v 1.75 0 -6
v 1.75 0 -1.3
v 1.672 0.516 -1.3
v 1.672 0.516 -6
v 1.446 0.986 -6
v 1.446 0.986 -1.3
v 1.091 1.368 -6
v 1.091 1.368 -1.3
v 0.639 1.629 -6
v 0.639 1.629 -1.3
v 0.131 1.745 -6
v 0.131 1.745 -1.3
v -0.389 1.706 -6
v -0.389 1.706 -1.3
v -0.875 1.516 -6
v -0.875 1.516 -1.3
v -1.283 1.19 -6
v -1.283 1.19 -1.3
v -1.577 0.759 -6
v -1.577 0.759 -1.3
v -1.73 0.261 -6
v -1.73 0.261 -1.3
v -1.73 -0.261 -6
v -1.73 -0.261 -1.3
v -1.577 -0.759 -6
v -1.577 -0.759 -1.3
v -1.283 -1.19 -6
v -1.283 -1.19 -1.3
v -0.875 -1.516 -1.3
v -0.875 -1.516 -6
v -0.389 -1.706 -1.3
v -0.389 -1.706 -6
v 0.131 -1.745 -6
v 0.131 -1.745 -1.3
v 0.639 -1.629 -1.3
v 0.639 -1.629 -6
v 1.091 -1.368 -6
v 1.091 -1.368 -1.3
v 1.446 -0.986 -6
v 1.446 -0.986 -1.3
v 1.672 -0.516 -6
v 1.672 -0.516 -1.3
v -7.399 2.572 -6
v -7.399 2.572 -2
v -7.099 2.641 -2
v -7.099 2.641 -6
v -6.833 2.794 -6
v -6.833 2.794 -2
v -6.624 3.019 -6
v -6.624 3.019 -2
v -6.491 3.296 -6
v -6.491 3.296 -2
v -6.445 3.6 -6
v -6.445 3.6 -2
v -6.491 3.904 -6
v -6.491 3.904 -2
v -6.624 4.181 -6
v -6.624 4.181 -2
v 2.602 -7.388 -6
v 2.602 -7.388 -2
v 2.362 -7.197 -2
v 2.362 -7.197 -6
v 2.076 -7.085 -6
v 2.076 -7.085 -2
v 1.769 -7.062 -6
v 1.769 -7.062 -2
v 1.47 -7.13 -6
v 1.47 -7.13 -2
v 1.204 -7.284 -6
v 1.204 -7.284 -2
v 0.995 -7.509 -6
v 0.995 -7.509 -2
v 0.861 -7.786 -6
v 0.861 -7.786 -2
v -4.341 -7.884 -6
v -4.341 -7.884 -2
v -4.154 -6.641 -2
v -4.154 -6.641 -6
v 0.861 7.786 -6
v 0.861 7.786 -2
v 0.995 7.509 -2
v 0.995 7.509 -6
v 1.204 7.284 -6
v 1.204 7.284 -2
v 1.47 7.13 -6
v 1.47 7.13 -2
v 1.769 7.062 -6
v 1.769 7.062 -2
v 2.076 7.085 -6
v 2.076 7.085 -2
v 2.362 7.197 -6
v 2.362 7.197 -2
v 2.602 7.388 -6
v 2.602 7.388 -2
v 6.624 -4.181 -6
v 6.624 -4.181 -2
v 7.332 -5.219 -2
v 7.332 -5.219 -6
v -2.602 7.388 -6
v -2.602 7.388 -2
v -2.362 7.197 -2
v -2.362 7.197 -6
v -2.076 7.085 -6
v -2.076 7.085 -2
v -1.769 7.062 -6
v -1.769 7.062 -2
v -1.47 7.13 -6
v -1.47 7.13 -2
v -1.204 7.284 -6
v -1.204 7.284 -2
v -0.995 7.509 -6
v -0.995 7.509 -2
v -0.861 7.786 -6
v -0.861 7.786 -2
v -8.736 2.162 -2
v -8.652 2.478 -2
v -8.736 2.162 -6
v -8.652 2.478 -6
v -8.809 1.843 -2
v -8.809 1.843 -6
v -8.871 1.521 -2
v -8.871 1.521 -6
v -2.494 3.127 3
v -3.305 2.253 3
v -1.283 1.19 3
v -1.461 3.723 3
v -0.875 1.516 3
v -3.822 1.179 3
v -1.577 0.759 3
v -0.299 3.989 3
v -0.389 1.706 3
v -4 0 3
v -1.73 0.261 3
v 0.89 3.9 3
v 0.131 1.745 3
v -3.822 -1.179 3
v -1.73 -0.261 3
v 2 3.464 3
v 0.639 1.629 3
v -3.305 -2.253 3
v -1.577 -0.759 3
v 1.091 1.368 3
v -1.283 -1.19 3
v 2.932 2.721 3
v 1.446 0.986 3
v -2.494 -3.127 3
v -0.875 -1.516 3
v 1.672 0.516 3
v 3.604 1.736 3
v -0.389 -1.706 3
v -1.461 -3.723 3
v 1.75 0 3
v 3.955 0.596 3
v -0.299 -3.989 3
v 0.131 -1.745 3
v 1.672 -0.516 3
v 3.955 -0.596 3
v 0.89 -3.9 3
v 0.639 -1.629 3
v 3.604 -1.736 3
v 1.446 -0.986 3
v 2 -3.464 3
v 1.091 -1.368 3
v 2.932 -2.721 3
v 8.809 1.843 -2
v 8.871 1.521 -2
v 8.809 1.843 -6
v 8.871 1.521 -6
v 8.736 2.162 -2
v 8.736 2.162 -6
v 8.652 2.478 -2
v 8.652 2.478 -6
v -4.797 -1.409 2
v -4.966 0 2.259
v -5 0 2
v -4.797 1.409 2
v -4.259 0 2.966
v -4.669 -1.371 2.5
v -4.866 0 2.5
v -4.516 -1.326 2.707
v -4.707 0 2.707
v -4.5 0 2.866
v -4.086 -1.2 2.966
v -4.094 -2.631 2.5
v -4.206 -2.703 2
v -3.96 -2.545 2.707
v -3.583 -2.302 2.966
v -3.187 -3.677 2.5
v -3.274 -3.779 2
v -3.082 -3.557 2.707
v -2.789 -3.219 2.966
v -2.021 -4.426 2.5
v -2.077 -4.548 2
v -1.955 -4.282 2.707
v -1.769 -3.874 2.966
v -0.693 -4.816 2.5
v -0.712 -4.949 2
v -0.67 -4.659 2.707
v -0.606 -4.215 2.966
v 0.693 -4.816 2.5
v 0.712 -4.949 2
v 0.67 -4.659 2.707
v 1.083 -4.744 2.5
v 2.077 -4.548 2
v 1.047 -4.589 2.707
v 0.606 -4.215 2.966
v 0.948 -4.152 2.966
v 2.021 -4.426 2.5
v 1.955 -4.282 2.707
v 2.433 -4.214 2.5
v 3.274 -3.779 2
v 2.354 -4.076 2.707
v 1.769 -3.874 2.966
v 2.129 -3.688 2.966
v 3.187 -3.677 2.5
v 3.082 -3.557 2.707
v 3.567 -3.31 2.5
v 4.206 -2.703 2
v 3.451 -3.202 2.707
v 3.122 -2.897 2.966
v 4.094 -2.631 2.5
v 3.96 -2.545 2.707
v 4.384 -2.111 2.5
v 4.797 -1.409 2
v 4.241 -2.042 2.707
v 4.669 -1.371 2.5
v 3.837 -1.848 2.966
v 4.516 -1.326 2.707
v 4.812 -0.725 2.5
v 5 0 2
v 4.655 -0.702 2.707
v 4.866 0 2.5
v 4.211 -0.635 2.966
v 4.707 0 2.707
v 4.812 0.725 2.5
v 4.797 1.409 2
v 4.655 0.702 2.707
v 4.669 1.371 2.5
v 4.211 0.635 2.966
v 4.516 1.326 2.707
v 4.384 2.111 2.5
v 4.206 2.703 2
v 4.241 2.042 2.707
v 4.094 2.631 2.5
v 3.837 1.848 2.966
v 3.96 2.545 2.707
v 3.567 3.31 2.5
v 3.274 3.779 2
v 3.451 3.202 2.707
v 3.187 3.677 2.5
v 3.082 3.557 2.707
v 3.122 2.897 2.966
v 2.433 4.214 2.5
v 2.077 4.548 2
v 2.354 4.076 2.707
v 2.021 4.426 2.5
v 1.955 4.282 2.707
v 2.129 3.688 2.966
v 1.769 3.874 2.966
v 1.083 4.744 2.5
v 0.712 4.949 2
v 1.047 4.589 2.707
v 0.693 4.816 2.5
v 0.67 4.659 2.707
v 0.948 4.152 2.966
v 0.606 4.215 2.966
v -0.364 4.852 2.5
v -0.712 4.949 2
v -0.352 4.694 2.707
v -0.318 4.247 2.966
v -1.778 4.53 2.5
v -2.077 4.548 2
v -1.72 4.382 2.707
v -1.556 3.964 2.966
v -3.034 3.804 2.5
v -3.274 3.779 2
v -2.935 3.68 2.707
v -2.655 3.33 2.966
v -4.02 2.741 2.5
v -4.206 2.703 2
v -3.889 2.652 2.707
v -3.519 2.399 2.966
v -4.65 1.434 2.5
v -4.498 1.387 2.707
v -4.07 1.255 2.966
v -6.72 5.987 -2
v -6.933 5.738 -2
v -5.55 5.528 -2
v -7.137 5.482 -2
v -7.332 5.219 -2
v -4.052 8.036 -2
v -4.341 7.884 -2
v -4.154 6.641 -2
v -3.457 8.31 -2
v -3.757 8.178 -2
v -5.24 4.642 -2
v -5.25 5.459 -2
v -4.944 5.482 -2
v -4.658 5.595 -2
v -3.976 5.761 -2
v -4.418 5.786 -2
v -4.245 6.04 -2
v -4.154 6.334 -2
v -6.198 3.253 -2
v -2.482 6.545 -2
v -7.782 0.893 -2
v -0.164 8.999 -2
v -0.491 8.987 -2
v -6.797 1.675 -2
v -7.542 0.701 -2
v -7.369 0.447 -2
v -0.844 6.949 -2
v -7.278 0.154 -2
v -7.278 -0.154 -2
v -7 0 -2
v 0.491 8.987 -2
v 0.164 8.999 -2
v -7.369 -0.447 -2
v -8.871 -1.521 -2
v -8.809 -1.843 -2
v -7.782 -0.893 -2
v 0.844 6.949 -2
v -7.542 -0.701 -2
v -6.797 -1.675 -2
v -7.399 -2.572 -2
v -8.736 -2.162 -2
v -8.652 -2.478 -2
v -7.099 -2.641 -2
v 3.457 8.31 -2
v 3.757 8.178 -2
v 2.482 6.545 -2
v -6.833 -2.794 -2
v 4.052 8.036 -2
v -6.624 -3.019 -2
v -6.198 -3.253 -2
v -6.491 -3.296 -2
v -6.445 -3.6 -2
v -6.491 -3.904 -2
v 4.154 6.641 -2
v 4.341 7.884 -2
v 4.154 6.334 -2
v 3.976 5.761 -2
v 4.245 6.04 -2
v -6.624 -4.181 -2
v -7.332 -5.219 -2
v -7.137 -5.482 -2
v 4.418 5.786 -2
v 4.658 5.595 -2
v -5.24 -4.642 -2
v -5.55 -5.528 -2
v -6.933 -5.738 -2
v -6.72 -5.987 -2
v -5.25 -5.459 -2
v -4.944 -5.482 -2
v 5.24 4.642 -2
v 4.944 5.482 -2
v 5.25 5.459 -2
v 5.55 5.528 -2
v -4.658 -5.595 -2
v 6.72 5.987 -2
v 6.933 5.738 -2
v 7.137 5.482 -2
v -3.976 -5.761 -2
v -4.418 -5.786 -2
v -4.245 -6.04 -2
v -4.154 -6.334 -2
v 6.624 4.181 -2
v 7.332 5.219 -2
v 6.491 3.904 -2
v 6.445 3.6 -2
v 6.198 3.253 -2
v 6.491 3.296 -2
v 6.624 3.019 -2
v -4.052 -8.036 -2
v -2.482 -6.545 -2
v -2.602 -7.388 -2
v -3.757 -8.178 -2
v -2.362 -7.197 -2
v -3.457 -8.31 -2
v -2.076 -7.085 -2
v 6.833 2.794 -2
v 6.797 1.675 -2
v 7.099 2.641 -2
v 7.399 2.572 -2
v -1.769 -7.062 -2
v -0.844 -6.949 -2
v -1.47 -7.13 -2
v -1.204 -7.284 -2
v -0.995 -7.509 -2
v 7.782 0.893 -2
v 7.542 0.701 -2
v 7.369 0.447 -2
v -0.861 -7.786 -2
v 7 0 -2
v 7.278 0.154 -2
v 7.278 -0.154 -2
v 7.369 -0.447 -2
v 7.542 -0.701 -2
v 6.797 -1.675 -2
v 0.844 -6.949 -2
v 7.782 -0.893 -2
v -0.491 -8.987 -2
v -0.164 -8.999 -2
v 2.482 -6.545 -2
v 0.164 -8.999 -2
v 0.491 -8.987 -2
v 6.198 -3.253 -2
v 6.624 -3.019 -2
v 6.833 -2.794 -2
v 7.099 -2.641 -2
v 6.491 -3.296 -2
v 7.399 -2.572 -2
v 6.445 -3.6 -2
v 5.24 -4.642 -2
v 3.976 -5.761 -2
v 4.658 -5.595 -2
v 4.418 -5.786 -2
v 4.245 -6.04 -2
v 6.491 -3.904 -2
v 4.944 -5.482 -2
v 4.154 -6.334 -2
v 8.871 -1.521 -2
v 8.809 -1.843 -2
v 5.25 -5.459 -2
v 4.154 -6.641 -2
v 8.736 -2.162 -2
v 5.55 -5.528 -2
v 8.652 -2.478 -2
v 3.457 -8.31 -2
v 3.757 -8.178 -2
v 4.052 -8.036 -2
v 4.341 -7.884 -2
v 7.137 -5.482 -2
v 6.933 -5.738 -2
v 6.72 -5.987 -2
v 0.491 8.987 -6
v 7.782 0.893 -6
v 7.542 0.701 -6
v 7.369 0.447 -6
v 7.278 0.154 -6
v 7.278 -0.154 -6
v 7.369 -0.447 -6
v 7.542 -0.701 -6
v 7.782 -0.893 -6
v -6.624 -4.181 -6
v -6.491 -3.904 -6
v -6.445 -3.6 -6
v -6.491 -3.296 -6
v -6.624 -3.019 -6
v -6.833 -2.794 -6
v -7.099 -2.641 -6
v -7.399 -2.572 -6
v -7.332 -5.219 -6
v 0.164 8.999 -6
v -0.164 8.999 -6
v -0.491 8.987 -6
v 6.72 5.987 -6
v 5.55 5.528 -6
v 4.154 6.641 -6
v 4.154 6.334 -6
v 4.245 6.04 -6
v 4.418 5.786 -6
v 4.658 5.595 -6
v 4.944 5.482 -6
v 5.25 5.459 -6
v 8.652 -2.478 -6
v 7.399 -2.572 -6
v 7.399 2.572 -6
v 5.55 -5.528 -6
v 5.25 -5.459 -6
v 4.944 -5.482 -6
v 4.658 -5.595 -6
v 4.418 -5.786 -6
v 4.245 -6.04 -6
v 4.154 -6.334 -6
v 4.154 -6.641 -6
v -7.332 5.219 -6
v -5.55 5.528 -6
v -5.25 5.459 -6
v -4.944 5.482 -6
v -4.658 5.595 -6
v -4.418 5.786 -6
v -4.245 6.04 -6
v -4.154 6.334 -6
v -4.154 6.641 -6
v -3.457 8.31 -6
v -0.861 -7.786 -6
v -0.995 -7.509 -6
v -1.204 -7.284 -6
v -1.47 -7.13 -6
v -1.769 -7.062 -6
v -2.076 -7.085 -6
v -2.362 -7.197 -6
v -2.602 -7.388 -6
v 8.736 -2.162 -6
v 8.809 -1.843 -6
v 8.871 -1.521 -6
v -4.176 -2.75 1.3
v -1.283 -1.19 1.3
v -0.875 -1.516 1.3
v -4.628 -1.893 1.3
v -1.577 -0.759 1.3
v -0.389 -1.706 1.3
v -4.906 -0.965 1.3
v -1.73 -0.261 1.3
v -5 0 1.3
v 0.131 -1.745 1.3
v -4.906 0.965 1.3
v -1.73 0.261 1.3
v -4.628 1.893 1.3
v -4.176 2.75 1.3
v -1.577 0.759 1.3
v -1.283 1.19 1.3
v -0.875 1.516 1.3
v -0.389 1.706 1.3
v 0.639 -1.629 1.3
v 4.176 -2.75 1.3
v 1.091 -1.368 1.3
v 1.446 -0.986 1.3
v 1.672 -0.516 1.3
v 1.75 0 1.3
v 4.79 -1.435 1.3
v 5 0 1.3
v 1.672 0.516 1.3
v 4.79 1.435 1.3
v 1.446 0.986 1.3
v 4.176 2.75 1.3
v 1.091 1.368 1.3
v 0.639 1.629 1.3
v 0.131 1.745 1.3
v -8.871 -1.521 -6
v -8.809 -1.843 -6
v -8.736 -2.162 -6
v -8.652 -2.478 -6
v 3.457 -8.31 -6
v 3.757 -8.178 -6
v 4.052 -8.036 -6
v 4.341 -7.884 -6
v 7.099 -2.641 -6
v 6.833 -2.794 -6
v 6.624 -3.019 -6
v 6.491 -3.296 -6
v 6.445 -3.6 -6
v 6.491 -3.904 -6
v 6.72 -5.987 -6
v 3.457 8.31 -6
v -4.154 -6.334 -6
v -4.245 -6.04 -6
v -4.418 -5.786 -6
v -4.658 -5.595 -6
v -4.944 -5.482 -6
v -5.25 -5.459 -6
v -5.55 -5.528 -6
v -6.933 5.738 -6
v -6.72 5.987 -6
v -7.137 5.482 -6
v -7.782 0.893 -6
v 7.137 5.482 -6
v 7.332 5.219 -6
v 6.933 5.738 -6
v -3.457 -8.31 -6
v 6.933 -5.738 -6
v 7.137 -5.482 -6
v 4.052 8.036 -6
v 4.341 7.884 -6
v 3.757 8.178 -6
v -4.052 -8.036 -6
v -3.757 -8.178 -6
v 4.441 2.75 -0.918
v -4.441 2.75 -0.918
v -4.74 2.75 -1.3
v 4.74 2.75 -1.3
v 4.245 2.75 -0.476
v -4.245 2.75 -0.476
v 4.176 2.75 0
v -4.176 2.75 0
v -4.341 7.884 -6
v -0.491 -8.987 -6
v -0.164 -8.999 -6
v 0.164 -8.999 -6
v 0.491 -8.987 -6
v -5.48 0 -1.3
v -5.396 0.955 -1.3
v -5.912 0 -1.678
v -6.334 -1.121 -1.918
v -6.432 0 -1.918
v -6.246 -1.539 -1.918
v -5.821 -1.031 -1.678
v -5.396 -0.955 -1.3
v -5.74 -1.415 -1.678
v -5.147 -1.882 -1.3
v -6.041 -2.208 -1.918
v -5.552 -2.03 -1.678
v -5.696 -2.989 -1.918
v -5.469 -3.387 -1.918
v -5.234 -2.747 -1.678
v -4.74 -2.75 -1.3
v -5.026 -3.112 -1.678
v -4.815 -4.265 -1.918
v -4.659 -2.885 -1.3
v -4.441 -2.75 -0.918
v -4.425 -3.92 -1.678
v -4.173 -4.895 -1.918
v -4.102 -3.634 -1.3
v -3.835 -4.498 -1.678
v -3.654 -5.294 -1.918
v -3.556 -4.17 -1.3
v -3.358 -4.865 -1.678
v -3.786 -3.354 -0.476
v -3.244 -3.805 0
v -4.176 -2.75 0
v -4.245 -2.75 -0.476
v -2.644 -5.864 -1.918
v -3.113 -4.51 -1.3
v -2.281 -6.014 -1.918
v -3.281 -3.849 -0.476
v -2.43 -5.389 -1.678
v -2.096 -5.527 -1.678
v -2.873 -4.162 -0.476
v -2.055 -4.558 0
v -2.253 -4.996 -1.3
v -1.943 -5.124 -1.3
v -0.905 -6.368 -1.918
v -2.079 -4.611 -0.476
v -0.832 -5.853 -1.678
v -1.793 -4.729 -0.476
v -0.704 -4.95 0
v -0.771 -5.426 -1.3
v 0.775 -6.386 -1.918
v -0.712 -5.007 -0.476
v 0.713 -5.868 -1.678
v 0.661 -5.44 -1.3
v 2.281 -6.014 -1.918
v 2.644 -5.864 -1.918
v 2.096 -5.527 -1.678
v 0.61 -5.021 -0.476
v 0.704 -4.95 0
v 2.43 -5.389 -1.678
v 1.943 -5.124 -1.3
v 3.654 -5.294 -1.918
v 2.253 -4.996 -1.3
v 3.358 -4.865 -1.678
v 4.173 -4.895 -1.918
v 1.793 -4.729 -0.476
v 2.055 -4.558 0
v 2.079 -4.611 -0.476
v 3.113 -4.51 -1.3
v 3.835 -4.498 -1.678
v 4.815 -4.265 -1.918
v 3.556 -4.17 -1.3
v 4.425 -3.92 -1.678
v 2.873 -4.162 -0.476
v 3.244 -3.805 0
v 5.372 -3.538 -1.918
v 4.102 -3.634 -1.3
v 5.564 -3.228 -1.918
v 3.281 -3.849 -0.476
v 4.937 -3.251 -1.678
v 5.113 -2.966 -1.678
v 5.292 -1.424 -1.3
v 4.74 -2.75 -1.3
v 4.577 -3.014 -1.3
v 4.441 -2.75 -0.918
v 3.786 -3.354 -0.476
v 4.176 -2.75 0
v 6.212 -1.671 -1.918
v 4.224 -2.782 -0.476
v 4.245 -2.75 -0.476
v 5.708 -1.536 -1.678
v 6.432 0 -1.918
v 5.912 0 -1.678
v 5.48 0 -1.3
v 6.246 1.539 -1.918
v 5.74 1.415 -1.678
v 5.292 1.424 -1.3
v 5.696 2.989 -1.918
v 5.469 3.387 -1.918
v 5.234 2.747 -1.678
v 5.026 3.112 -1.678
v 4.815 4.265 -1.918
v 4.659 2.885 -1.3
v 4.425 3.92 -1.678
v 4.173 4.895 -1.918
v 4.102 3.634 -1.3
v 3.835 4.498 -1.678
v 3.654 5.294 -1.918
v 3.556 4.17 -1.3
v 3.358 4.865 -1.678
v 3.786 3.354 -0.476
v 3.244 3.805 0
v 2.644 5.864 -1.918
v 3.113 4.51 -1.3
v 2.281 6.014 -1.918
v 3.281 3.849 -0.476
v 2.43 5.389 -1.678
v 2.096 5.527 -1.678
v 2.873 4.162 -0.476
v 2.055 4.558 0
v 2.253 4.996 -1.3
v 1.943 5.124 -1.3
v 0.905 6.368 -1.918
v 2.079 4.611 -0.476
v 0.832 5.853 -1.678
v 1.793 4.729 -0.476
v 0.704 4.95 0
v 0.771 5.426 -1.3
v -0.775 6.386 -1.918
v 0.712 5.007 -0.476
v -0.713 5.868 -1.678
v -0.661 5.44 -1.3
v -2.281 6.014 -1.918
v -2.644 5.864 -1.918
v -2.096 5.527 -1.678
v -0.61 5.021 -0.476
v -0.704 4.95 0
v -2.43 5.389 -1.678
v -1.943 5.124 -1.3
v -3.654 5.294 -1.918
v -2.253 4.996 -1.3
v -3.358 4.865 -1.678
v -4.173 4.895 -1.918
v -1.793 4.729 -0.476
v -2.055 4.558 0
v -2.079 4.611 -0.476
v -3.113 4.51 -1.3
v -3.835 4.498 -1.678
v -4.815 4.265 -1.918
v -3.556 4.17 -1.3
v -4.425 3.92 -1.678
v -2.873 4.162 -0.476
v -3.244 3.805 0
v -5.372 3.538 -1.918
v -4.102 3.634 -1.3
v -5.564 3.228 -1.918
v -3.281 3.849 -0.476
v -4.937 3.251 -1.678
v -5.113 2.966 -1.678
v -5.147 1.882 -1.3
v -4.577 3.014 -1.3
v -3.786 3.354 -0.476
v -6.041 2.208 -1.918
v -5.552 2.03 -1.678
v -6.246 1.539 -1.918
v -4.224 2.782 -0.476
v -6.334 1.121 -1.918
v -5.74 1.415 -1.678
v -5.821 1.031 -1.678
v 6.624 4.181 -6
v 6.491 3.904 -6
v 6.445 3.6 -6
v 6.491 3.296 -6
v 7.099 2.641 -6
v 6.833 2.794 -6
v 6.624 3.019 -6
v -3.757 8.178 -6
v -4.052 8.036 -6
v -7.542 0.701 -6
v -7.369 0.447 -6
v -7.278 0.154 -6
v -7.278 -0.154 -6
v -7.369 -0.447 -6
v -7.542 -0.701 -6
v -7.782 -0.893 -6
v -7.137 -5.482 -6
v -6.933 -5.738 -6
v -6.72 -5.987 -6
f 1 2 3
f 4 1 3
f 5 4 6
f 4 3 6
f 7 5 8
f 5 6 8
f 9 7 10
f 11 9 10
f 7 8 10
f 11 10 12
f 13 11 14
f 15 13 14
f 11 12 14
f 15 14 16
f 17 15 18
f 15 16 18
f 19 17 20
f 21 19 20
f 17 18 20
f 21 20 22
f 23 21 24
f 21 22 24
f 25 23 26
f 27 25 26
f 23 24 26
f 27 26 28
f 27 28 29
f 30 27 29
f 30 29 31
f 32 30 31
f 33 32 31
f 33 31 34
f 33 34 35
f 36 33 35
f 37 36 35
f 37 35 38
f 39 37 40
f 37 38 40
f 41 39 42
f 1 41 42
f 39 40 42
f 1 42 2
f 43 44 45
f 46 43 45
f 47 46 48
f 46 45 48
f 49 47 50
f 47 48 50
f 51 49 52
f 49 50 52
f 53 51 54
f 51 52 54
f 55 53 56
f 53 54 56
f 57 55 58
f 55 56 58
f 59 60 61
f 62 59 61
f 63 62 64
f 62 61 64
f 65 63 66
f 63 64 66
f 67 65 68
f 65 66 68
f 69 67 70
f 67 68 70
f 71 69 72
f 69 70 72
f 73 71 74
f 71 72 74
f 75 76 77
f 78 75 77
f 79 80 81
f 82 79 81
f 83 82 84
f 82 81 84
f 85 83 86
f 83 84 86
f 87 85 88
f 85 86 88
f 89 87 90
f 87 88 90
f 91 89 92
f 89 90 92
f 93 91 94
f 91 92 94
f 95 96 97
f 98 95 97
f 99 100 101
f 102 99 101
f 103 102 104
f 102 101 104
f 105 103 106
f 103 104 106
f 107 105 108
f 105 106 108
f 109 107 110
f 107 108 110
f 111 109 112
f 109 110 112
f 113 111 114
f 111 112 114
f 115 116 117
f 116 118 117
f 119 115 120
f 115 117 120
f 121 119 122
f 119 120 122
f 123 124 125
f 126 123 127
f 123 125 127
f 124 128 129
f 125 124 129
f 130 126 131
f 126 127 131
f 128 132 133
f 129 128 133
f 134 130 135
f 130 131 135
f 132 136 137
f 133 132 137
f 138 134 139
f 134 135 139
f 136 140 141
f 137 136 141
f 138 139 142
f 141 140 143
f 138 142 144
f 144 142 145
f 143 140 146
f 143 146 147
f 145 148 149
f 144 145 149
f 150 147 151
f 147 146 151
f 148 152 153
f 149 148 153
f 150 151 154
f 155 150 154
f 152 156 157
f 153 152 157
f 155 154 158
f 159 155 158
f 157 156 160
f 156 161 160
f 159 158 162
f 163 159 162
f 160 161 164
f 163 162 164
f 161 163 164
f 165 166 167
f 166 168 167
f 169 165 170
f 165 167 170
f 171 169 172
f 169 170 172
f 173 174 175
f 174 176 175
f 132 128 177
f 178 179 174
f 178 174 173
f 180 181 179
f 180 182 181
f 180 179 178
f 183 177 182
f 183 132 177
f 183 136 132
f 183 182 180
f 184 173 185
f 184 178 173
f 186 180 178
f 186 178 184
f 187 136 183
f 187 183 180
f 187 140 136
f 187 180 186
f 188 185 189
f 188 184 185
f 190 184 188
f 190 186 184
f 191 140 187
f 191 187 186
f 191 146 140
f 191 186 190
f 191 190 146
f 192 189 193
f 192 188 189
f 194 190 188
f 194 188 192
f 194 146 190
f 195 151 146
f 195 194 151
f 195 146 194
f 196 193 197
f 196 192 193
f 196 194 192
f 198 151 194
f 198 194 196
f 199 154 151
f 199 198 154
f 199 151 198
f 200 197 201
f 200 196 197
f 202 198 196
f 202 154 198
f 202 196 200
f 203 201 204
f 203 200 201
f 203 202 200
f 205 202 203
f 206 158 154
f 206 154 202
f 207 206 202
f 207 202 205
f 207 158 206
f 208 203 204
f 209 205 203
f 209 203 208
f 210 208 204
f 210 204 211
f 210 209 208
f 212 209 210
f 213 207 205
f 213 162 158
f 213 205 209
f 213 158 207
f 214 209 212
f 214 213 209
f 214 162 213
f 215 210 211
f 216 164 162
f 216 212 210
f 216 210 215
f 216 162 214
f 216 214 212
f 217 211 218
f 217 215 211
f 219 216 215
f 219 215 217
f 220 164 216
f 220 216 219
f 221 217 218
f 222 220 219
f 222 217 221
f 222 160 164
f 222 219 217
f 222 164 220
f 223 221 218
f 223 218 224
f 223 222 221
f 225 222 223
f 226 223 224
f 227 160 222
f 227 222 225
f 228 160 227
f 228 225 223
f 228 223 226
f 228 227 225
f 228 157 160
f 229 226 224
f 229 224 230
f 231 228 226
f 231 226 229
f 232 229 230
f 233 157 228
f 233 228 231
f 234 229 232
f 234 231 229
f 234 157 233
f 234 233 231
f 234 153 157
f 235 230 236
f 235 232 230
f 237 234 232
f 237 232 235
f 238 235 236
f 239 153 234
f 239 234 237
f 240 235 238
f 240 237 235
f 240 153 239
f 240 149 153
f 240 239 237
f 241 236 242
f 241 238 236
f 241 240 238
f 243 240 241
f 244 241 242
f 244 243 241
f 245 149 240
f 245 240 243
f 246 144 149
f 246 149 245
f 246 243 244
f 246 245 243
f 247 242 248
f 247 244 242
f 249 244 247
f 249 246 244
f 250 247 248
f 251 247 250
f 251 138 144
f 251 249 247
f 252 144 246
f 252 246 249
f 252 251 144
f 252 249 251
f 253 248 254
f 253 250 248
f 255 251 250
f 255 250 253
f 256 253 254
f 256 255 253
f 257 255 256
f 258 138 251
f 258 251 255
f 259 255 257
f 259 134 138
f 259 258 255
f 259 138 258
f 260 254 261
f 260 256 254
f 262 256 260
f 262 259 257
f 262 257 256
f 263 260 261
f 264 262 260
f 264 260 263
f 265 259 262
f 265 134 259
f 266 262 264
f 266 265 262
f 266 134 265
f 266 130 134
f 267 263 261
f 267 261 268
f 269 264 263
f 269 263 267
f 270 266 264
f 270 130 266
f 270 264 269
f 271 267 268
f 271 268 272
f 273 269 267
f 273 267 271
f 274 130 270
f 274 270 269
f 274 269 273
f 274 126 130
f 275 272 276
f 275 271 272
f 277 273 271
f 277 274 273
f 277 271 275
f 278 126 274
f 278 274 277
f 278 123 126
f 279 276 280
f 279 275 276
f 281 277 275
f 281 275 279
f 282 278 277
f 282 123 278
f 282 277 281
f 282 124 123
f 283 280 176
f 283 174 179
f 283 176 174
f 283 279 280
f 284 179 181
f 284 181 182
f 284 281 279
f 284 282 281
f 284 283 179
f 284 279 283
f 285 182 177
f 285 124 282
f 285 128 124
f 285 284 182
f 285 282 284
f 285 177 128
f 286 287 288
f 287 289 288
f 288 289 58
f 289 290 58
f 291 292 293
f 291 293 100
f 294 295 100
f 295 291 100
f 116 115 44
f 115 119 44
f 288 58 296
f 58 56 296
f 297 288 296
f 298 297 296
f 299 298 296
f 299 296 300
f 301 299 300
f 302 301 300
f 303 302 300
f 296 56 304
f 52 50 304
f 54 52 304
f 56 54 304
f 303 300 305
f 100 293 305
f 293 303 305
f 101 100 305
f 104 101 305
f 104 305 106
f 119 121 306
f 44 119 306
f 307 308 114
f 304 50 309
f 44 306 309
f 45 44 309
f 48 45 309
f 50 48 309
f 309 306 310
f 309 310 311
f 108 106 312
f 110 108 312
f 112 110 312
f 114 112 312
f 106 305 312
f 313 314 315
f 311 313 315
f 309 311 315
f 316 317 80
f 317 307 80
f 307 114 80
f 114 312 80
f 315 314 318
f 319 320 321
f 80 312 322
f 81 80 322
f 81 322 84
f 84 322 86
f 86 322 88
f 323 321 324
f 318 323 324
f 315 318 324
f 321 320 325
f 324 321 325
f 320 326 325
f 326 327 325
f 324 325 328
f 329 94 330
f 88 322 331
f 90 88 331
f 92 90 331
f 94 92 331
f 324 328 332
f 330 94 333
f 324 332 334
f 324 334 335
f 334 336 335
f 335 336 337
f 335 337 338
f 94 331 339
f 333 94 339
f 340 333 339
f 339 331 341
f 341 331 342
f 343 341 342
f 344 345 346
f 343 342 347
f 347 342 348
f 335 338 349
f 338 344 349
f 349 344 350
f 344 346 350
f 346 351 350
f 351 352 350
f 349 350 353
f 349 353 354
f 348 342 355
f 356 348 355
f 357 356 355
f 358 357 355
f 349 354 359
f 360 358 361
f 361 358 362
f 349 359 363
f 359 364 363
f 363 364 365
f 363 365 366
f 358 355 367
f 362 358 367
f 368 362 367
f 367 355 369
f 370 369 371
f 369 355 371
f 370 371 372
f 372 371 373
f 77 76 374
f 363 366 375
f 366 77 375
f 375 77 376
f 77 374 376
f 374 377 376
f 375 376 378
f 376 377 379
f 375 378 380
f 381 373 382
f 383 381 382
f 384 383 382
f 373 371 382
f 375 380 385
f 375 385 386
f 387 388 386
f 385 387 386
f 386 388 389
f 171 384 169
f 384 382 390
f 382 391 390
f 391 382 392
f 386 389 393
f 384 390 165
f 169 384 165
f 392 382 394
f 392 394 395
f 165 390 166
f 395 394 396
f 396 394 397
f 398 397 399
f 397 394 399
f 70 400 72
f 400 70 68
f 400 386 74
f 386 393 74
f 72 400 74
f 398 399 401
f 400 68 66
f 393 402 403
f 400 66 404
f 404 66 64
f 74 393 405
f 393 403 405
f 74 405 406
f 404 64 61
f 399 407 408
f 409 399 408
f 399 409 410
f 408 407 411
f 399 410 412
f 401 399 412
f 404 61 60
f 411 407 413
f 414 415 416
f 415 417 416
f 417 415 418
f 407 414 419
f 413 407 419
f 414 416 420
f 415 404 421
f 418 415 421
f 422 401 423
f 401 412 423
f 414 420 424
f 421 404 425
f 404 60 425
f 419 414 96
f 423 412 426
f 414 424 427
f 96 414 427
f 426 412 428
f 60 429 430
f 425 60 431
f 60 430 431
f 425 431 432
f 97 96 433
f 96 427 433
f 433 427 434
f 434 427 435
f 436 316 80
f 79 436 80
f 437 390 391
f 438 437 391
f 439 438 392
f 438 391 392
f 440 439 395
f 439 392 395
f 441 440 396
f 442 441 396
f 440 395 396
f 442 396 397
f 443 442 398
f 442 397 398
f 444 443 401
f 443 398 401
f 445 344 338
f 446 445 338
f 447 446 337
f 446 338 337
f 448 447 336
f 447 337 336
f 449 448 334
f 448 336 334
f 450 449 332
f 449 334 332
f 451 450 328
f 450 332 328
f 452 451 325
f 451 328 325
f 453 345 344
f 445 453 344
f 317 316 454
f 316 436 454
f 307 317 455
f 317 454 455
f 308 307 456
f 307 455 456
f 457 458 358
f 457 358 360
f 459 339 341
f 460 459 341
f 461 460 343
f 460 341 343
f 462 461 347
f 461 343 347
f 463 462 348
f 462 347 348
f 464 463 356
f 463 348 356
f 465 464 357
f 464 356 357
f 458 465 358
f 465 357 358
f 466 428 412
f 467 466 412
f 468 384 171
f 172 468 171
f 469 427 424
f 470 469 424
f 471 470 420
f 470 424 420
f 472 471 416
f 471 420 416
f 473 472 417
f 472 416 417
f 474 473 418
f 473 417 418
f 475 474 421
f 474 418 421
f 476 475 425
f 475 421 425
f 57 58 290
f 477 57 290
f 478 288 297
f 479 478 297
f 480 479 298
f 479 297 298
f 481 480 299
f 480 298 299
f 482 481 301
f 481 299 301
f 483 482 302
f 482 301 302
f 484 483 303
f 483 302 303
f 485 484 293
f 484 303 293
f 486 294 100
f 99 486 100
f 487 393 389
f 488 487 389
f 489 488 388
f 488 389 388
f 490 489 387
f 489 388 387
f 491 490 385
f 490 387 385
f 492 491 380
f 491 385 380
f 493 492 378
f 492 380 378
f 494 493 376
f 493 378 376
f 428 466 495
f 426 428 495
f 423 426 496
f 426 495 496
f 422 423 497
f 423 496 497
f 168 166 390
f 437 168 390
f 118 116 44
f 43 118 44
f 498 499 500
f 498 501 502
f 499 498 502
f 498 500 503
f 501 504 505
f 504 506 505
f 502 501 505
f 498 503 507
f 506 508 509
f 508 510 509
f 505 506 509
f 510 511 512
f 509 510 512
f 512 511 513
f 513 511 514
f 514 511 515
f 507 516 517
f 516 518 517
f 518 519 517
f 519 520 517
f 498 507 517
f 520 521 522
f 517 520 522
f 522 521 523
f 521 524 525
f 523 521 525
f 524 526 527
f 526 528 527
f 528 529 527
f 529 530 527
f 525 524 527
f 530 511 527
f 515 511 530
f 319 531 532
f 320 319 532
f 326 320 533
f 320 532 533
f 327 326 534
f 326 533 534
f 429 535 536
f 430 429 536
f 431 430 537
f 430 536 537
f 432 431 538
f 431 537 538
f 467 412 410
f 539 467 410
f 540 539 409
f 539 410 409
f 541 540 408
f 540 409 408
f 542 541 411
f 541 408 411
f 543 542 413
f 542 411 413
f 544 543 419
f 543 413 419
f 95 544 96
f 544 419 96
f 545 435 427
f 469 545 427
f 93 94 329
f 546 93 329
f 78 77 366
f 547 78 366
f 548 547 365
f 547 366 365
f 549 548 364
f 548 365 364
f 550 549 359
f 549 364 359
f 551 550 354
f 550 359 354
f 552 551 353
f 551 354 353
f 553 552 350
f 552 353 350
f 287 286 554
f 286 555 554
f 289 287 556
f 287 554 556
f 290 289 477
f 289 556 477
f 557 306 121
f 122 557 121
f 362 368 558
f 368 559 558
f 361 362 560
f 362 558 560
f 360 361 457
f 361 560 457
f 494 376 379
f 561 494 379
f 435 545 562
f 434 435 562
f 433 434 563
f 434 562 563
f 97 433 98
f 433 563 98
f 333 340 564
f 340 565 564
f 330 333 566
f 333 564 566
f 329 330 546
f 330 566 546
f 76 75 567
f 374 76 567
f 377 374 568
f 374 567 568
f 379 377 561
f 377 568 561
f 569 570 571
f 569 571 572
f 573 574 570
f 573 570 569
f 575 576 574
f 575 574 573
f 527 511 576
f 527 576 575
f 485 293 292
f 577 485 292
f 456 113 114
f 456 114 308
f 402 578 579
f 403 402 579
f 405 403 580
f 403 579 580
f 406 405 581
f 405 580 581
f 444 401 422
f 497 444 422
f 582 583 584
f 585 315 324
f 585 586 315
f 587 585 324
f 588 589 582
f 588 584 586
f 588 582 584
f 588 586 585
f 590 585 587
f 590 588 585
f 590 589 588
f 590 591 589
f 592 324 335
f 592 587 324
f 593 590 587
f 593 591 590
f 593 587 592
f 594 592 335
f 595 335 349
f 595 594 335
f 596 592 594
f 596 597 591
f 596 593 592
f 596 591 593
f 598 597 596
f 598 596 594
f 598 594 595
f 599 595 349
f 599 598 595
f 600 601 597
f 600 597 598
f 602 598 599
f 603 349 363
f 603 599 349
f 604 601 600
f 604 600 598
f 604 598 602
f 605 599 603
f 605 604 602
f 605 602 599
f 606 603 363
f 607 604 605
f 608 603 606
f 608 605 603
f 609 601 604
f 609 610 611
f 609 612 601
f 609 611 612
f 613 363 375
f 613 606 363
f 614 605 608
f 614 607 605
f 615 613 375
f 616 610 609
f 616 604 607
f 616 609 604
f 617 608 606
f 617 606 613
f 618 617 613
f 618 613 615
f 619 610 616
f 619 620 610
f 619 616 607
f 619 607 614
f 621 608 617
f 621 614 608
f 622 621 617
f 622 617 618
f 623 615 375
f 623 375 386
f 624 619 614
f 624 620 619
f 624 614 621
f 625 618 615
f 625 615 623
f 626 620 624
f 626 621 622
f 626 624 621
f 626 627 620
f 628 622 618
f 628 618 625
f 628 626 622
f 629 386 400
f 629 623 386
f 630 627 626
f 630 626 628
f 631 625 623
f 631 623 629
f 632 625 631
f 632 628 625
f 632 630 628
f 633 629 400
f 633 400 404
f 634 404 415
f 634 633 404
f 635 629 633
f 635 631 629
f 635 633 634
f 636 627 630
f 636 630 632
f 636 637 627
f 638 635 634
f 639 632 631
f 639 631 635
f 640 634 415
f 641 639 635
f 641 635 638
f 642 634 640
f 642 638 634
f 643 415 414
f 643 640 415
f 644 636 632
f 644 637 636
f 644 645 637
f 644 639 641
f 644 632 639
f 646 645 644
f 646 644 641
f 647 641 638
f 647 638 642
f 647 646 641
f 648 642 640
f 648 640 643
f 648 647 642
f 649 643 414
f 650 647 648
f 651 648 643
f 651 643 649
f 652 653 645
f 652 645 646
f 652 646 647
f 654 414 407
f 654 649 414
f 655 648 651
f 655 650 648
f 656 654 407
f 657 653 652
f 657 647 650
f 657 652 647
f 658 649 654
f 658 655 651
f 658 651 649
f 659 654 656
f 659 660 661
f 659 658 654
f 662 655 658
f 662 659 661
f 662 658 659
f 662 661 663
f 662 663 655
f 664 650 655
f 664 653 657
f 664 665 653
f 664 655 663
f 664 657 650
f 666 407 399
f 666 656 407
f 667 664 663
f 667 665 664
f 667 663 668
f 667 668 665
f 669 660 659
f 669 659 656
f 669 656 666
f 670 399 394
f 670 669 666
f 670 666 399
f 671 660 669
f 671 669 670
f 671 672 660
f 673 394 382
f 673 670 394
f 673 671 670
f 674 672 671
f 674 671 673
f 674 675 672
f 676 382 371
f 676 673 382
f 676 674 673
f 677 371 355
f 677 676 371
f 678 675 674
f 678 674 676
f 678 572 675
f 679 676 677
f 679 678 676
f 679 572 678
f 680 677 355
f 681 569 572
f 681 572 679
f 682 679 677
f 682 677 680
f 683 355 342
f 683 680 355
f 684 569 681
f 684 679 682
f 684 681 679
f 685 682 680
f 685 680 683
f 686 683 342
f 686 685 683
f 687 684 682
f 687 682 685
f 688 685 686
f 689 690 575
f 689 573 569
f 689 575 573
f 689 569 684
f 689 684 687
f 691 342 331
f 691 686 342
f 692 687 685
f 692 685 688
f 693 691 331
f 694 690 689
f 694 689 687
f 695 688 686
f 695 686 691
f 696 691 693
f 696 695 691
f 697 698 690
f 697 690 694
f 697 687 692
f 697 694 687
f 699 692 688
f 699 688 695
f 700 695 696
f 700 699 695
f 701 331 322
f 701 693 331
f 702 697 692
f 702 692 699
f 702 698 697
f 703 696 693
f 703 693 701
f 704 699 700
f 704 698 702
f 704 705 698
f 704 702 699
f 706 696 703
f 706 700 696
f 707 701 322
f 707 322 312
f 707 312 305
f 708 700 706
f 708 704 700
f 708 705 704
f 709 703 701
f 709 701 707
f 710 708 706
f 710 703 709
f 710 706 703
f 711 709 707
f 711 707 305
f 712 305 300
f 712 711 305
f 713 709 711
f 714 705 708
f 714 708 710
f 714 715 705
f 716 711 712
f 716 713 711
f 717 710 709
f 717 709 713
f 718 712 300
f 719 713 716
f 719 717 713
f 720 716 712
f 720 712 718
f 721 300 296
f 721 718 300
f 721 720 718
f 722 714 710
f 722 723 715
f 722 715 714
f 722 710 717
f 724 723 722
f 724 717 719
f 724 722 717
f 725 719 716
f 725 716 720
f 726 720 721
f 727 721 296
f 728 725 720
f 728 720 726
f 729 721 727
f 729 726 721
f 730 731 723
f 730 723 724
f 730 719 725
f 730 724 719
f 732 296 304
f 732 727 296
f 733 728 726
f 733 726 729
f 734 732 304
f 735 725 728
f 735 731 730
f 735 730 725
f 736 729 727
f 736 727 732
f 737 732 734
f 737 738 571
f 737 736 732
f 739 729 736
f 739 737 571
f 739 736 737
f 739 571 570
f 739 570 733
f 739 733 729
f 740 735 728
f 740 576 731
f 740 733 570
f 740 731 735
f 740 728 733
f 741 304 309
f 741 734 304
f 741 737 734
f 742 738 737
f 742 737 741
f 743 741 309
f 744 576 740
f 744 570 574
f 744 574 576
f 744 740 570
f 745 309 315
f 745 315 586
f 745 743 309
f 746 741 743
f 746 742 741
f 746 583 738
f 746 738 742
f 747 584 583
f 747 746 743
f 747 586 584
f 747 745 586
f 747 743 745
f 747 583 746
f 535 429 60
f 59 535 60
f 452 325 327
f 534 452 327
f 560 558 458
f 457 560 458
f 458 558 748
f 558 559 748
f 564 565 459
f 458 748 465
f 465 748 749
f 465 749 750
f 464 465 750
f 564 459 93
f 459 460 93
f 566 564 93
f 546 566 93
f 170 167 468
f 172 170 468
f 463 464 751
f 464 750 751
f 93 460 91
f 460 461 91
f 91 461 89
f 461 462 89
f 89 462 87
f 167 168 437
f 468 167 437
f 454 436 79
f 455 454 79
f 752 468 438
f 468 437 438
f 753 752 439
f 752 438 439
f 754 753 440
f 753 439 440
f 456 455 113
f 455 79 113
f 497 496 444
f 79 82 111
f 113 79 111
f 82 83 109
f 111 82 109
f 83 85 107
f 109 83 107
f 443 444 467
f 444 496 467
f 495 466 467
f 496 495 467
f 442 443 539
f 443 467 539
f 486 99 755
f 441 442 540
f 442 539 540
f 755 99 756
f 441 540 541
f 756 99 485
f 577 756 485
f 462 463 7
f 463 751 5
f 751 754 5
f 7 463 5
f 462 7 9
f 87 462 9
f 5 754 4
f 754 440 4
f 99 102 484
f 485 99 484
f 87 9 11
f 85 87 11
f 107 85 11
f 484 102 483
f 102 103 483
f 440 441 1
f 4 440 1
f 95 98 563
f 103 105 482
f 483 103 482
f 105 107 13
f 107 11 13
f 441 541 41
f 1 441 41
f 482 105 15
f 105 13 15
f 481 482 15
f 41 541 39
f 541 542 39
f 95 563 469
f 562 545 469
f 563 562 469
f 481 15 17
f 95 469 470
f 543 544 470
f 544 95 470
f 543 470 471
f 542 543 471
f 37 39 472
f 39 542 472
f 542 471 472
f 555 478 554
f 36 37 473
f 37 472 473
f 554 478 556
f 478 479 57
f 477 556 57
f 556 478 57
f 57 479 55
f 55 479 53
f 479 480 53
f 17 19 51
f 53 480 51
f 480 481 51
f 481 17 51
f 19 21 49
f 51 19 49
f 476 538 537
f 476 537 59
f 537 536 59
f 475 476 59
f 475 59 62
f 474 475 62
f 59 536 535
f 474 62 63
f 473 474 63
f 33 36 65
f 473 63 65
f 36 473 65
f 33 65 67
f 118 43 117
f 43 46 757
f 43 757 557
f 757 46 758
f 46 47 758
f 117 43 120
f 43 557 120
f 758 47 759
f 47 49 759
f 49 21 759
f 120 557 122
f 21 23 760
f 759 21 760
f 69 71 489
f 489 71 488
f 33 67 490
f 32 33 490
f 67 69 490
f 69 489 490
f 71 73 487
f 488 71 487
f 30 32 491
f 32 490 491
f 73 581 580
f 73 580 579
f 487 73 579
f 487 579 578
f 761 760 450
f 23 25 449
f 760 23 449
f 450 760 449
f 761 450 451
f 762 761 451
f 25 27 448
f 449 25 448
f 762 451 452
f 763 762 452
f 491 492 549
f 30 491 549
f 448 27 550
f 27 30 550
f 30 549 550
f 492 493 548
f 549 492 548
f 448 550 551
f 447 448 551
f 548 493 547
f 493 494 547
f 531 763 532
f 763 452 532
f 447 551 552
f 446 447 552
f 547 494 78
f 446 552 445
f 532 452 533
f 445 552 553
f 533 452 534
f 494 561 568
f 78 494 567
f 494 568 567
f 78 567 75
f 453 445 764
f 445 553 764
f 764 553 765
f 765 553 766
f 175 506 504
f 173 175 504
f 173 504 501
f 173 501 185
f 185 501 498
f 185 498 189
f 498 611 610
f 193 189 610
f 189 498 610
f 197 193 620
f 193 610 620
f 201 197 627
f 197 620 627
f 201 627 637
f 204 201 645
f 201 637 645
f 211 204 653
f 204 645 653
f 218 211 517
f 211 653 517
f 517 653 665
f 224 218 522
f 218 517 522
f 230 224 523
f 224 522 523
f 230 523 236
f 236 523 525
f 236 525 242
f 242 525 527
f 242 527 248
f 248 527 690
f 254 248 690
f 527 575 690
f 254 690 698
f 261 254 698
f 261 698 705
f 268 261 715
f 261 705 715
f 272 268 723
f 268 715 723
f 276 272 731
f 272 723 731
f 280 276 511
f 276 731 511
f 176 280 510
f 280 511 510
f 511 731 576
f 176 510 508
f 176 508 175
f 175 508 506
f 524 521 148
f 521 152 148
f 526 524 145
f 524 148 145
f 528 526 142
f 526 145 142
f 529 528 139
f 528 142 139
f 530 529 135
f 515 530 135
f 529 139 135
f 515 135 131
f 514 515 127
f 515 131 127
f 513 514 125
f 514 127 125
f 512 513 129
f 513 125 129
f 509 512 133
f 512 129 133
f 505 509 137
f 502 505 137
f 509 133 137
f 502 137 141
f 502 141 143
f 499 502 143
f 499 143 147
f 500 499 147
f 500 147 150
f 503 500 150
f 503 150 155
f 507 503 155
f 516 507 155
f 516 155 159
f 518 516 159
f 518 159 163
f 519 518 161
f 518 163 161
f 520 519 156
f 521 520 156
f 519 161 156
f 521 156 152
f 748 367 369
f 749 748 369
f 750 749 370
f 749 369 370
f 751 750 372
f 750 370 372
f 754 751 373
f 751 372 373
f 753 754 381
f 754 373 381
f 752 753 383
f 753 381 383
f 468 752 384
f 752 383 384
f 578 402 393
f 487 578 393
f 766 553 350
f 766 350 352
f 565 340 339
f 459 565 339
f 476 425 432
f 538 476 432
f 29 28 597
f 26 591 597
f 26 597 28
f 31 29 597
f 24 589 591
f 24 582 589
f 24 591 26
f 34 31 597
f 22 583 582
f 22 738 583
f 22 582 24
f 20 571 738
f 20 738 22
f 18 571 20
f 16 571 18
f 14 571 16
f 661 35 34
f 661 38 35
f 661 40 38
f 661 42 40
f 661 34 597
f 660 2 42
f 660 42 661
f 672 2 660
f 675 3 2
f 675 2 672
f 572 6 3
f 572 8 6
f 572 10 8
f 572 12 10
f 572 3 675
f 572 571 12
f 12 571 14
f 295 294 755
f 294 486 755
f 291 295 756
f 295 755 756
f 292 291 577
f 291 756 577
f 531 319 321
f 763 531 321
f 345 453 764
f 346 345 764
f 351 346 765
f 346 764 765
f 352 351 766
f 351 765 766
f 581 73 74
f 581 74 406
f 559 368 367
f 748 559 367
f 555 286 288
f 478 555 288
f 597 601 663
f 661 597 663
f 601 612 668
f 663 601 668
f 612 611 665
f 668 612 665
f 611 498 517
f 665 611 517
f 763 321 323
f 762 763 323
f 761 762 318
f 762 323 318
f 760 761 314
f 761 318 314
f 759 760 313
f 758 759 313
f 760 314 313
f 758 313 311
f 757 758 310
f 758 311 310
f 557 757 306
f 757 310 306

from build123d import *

# Parameters (mm, degrees)
F3_R     = 1.75
F4_DEPTH = 12.5
F6_R     = 2
F8_DEPTH = 10
F2_W     = 25.478227
F2_H     = 5.5
F9_DEPTH = 1.3
F10_R    = 1


with BuildPart() as f1:
    # F0 (on Front) → F1 (revolve)
    with BuildSketch(Plane.XZ):
        Polygon((-9, -6), (0, -6), (0, 3), (-5, 3), (-5, -2), (-9, -2), align=None)
    revolve(axis=Axis((0, 0, -1.5), (0, 0, 1)))


with BuildPart() as f4:
    # F3 (on Top) → F4 (new body, symmetric)
    with BuildSketch(Plane.XY):
        Circle(F3_R)
    extrude(amount=F4_DEPTH, both=True)


with BuildPart() as f1_1:
    add(f1.part)

    # F5: cut F4
    add(f4.part, mode=Mode.SUBTRACT)

    # F6
    f6_edges = [f1_1.edges().sort_by_distance(p)[0] for p in [
        (5, 0, -2),
    ]]
    fillet(f6_edges, radius=F6_R)

    # F7 (on Top) → F8 (cut)
    with BuildSketch(Plane.XY):
        with BuildLine():
            ThreePointArc((-7.782135, -0.892736), (-7.266714, 0), (-7.782135, 0.892736))
            Line((-7.782135, 0.892736), (-10.312837, 2.353838))
            Line((-10.312837, 2.353838), (-10.499112, 2.339878))
            Line((-10.499112, 2.339878), (-10.499112, -2.339878))
            Line((-10.499112, -2.339878), (-10.312837, -2.353838))
            Line((-10.312837, -2.353838), (-7.782135, -0.892736))
        make_face()
        with BuildLine():
            Line((-10.474608, 2.447236), (-10.312837, 2.353838))
            Line((-10.312837, 2.353838), (-7.398805, 2.572214))
            ThreePointArc((-7.398805, 2.572214), (-6.547083, 3.152909), (-6.624118, 4.180869))
            Line((-6.624118, 4.180869), (-8.270253, 6.595307))
            Line((-8.270253, 6.595307), (-8.444138, 6.663552))
            Line((-8.444138, 6.663552), (-10.474608, 2.447236))
        make_face()
        Polygon((-10.499112, 2.396354), (-10.474608, 2.447236), (-10.499112, 2.461384), align=None)
        Polygon((-10.527328, 2.337764), (-10.499112, 2.339878), (-10.499112, 2.396354), align=None)
        with BuildLine():
            Line((-7.398805, -2.572214), (-10.312837, -2.353838))
            Line((-10.312837, -2.353838), (-10.474608, -2.447236))
            Line((-10.474608, -2.447236), (-8.444138, -6.663552))
            Line((-8.444138, -6.663552), (-8.270253, -6.595307))
            Line((-8.270253, -6.595307), (-6.624118, -4.180869))
            ThreePointArc((-6.624118, -4.180869), (-6.547083, -3.152909), (-7.398805, -2.572214))
        make_face()
        Polygon((-8.470477, 6.673889), (-8.444138, 6.663552), (-8.419634, 6.714434), align=None)
        Polygon((-10.499112, -2.396354), (-10.499112, -2.339878), (-10.527328, -2.337764), align=None)
        Polygon((-10.499112, -2.461384), (-10.474608, -2.447236), (-10.499112, -2.396354), align=None)
        with BuildLine():
            Line((-8.37548, 6.749646), (-8.270253, 6.595307))
            Line((-8.270253, 6.595307), (-5.550051, 5.527706))
            ThreePointArc((-5.550051, 5.527706), (-4.530722, 5.681345), (-4.154113, 6.64093))
            Line((-4.154113, 6.64093), (-4.589644, 9.530495))
            Line((-4.589644, 9.530495), (-4.716699, 9.667427))
            Line((-4.716699, 9.667427), (-8.37548, 6.749646))
        make_face()
        Polygon((-8.391419, 6.773024), (-8.419634, 6.714434), (-8.37548, 6.749646), align=None)
        Polygon((-8.419634, -6.714434), (-8.444138, -6.663552), (-8.470477, -6.673889), align=None)
        Polygon((-8.37548, -6.749646), (-8.419634, -6.714434), (-8.391419, -6.773024), align=None)
        with BuildLine():
            Line((-5.550051, -5.527706), (-8.270253, -6.595307))
            Line((-8.270253, -6.595307), (-8.37548, -6.749646))
            Line((-8.37548, -6.749646), (-4.716699, -9.667427))
            Line((-4.716699, -9.667427), (-4.589644, -9.530495))
            Line((-4.589644, -9.530495), (-4.154113, -6.64093))
            ThreePointArc((-4.154113, -6.64093), (-4.530722, -5.681345), (-5.550051, -5.527706))
        make_face()
        Polygon((-4.735944, 9.688168), (-4.716699, 9.667427), (-4.672544, 9.702639), align=None)
        with BuildLine():
            Line((-4.617485, 9.715206), (-4.589644, 9.530495))
            Line((-4.589644, 9.530495), (-2.602041, 7.388368))
            ThreePointArc((-2.602041, 7.388368), (-1.616996, 7.084522), (-0.861334, 7.785673))
            Line((-0.861334, 7.785673), (0, 10.578051))
            Line((0, 10.578051), (-0.055059, 10.756549))
            Line((-0.055059, 10.756549), (-4.617485, 9.715206))
        make_face()
        Polygon((-4.621702, 9.743184), (-4.672544, 9.702639), (-4.617485, 9.715206), align=None)
        Polygon((-4.672544, -9.702639), (-4.716699, -9.667427), (-4.735944, -9.688168), align=None)
        Polygon((-4.617485, -9.715206), (-4.672544, -9.702639), (-4.621702, -9.743184), align=None)
        with BuildLine():
            Line((-2.602041, -7.388368), (-4.589644, -9.530495))
            Line((-4.589644, -9.530495), (-4.617485, -9.715206))
            Line((-4.617485, -9.715206), (-0.055059, -10.756549))
            Line((-0.055059, -10.756549), (0, -10.578051))
            Line((0, -10.578051), (-0.861334, -7.785673))
            ThreePointArc((-0.861334, -7.785673), (-1.616996, -7.084522), (-2.602041, -7.388368))
        make_face()
        Polygon((-0.063399, 10.783587), (-0.055059, 10.756549), (0, 10.769116), align=None)
        with BuildLine():
            Line((0.055059, 10.756549), (0, 10.578051))
            Line((0, 10.578051), (0.861334, 7.785673))
            ThreePointArc((0.861334, 7.785673), (1.616996, 7.084522), (2.602041, 7.388368))
            Line((2.602041, 7.388368), (4.589644, 9.530495))
            Line((4.589644, 9.530495), (4.617485, 9.715206))
            Line((4.617485, 9.715206), (0.055059, 10.756549))
        make_face()
        Polygon((0.063399, 10.783587), (0, 10.769116), (0.055059, 10.756549), align=None)
        Polygon((0, -10.769116), (-0.055059, -10.756549), (-0.063399, -10.783587), align=None)
        Polygon((0.055059, -10.756549), (0, -10.769116), (0.063399, -10.783587), align=None)
        with BuildLine():
            Line((0.861334, -7.785673), (0, -10.578051))
            Line((0, -10.578051), (0.055059, -10.756549))
            Line((0.055059, -10.756549), (4.617485, -9.715206))
            Line((4.617485, -9.715206), (4.589644, -9.530495))
            Line((4.589644, -9.530495), (2.602041, -7.388368))
            ThreePointArc((2.602041, -7.388368), (1.616996, -7.084522), (0.861334, -7.785673))
        make_face()
        Polygon((4.621702, 9.743184), (4.617485, 9.715206), (4.672544, 9.702639), align=None)
        with BuildLine():
            Line((4.716699, 9.667427), (4.589644, 9.530495))
            Line((4.589644, 9.530495), (4.154113, 6.64093))
            ThreePointArc((4.154113, 6.64093), (4.530722, 5.681345), (5.550051, 5.527706))
            Line((5.550051, 5.527706), (8.270253, 6.595307))
            Line((8.270253, 6.595307), (8.37548, 6.749646))
            Line((8.37548, 6.749646), (4.716699, 9.667427))
        make_face()
        Polygon((4.735944, 9.688168), (4.672544, 9.702639), (4.716699, 9.667427), align=None)
        Polygon((4.672544, -9.702639), (4.617485, -9.715206), (4.621702, -9.743184), align=None)
        Polygon((4.716699, -9.667427), (4.672544, -9.702639), (4.735944, -9.688168), align=None)
        with BuildLine():
            Line((4.154113, -6.64093), (4.589644, -9.530495))
            Line((4.589644, -9.530495), (4.716699, -9.667427))
            Line((4.716699, -9.667427), (8.37548, -6.749646))
            Line((8.37548, -6.749646), (8.270253, -6.595307))
            Line((8.270253, -6.595307), (5.550051, -5.527706))
            ThreePointArc((5.550051, -5.527706), (4.530722, -5.681345), (4.154113, -6.64093))
        make_face()
        Polygon((8.391419, 6.773024), (8.37548, 6.749646), (8.419634, 6.714434), align=None)
        with BuildLine():
            Line((8.444138, 6.663552), (8.270253, 6.595307))
            Line((8.270253, 6.595307), (6.624118, 4.180869))
            ThreePointArc((6.624118, 4.180869), (6.547083, 3.152909), (7.398805, 2.572214))
            Line((7.398805, 2.572214), (10.312837, 2.353838))
            Line((10.312837, 2.353838), (10.474608, 2.447236))
            Line((10.474608, 2.447236), (8.444138, 6.663552))
        make_face()
        Polygon((8.470477, 6.673889), (8.419634, 6.714434), (8.444138, 6.663552), align=None)
        Polygon((8.419634, -6.714434), (8.37548, -6.749646), (8.391419, -6.773024), align=None)
        Polygon((8.444138, -6.663552), (8.419634, -6.714434), (8.470477, -6.673889), align=None)
        with BuildLine():
            Line((6.624118, -4.180869), (8.270253, -6.595307))
            Line((8.270253, -6.595307), (8.444138, -6.663552))
            Line((8.444138, -6.663552), (10.474608, -2.447236))
            Line((10.474608, -2.447236), (10.312837, -2.353838))
            Line((10.312837, -2.353838), (7.398805, -2.572214))
            ThreePointArc((7.398805, -2.572214), (6.547083, -3.152909), (6.624118, -4.180869))
        make_face()
        Polygon((10.499112, 2.461384), (10.474608, 2.447236), (10.499112, 2.396354), align=None)
        with BuildLine():
            Line((10.499112, 2.339878), (10.312837, 2.353838))
            Line((10.312837, 2.353838), (7.782135, 0.892736))
            ThreePointArc((7.782135, 0.892736), (7.266714, 0), (7.782135, -0.892736))
            Line((7.782135, -0.892736), (10.312837, -2.353838))
            Line((10.312837, -2.353838), (10.499112, -2.339878))
            Line((10.499112, -2.339878), (10.499112, 2.339878))
        make_face()
        Polygon((10.527328, 2.337764), (10.499112, 2.396354), (10.499112, 2.339878), align=None)
        Polygon((10.499112, -2.396354), (10.474608, -2.447236), (10.499112, -2.461384), align=None)
        Polygon((10.499112, -2.339878), (10.499112, -2.396354), (10.527328, -2.337764), align=None)
    extrude(amount=-F8_DEPTH, mode=Mode.SUBTRACT)

    # F2 (on Top) → F9 (cut, symmetric)
    with BuildSketch(Plane.XY):
        with Locations((1.864194, 0)):
            Rectangle(F2_W, F2_H)
    extrude(amount=F9_DEPTH, both=True, mode=Mode.SUBTRACT)

    # F10
    f10_edges = [f1_1.edges().sort_by_distance(p)[0] for p in [
        (5, 0, 3),
    ]]
    fillet(f10_edges, radius=F10_R)


solid = f1_1.part
